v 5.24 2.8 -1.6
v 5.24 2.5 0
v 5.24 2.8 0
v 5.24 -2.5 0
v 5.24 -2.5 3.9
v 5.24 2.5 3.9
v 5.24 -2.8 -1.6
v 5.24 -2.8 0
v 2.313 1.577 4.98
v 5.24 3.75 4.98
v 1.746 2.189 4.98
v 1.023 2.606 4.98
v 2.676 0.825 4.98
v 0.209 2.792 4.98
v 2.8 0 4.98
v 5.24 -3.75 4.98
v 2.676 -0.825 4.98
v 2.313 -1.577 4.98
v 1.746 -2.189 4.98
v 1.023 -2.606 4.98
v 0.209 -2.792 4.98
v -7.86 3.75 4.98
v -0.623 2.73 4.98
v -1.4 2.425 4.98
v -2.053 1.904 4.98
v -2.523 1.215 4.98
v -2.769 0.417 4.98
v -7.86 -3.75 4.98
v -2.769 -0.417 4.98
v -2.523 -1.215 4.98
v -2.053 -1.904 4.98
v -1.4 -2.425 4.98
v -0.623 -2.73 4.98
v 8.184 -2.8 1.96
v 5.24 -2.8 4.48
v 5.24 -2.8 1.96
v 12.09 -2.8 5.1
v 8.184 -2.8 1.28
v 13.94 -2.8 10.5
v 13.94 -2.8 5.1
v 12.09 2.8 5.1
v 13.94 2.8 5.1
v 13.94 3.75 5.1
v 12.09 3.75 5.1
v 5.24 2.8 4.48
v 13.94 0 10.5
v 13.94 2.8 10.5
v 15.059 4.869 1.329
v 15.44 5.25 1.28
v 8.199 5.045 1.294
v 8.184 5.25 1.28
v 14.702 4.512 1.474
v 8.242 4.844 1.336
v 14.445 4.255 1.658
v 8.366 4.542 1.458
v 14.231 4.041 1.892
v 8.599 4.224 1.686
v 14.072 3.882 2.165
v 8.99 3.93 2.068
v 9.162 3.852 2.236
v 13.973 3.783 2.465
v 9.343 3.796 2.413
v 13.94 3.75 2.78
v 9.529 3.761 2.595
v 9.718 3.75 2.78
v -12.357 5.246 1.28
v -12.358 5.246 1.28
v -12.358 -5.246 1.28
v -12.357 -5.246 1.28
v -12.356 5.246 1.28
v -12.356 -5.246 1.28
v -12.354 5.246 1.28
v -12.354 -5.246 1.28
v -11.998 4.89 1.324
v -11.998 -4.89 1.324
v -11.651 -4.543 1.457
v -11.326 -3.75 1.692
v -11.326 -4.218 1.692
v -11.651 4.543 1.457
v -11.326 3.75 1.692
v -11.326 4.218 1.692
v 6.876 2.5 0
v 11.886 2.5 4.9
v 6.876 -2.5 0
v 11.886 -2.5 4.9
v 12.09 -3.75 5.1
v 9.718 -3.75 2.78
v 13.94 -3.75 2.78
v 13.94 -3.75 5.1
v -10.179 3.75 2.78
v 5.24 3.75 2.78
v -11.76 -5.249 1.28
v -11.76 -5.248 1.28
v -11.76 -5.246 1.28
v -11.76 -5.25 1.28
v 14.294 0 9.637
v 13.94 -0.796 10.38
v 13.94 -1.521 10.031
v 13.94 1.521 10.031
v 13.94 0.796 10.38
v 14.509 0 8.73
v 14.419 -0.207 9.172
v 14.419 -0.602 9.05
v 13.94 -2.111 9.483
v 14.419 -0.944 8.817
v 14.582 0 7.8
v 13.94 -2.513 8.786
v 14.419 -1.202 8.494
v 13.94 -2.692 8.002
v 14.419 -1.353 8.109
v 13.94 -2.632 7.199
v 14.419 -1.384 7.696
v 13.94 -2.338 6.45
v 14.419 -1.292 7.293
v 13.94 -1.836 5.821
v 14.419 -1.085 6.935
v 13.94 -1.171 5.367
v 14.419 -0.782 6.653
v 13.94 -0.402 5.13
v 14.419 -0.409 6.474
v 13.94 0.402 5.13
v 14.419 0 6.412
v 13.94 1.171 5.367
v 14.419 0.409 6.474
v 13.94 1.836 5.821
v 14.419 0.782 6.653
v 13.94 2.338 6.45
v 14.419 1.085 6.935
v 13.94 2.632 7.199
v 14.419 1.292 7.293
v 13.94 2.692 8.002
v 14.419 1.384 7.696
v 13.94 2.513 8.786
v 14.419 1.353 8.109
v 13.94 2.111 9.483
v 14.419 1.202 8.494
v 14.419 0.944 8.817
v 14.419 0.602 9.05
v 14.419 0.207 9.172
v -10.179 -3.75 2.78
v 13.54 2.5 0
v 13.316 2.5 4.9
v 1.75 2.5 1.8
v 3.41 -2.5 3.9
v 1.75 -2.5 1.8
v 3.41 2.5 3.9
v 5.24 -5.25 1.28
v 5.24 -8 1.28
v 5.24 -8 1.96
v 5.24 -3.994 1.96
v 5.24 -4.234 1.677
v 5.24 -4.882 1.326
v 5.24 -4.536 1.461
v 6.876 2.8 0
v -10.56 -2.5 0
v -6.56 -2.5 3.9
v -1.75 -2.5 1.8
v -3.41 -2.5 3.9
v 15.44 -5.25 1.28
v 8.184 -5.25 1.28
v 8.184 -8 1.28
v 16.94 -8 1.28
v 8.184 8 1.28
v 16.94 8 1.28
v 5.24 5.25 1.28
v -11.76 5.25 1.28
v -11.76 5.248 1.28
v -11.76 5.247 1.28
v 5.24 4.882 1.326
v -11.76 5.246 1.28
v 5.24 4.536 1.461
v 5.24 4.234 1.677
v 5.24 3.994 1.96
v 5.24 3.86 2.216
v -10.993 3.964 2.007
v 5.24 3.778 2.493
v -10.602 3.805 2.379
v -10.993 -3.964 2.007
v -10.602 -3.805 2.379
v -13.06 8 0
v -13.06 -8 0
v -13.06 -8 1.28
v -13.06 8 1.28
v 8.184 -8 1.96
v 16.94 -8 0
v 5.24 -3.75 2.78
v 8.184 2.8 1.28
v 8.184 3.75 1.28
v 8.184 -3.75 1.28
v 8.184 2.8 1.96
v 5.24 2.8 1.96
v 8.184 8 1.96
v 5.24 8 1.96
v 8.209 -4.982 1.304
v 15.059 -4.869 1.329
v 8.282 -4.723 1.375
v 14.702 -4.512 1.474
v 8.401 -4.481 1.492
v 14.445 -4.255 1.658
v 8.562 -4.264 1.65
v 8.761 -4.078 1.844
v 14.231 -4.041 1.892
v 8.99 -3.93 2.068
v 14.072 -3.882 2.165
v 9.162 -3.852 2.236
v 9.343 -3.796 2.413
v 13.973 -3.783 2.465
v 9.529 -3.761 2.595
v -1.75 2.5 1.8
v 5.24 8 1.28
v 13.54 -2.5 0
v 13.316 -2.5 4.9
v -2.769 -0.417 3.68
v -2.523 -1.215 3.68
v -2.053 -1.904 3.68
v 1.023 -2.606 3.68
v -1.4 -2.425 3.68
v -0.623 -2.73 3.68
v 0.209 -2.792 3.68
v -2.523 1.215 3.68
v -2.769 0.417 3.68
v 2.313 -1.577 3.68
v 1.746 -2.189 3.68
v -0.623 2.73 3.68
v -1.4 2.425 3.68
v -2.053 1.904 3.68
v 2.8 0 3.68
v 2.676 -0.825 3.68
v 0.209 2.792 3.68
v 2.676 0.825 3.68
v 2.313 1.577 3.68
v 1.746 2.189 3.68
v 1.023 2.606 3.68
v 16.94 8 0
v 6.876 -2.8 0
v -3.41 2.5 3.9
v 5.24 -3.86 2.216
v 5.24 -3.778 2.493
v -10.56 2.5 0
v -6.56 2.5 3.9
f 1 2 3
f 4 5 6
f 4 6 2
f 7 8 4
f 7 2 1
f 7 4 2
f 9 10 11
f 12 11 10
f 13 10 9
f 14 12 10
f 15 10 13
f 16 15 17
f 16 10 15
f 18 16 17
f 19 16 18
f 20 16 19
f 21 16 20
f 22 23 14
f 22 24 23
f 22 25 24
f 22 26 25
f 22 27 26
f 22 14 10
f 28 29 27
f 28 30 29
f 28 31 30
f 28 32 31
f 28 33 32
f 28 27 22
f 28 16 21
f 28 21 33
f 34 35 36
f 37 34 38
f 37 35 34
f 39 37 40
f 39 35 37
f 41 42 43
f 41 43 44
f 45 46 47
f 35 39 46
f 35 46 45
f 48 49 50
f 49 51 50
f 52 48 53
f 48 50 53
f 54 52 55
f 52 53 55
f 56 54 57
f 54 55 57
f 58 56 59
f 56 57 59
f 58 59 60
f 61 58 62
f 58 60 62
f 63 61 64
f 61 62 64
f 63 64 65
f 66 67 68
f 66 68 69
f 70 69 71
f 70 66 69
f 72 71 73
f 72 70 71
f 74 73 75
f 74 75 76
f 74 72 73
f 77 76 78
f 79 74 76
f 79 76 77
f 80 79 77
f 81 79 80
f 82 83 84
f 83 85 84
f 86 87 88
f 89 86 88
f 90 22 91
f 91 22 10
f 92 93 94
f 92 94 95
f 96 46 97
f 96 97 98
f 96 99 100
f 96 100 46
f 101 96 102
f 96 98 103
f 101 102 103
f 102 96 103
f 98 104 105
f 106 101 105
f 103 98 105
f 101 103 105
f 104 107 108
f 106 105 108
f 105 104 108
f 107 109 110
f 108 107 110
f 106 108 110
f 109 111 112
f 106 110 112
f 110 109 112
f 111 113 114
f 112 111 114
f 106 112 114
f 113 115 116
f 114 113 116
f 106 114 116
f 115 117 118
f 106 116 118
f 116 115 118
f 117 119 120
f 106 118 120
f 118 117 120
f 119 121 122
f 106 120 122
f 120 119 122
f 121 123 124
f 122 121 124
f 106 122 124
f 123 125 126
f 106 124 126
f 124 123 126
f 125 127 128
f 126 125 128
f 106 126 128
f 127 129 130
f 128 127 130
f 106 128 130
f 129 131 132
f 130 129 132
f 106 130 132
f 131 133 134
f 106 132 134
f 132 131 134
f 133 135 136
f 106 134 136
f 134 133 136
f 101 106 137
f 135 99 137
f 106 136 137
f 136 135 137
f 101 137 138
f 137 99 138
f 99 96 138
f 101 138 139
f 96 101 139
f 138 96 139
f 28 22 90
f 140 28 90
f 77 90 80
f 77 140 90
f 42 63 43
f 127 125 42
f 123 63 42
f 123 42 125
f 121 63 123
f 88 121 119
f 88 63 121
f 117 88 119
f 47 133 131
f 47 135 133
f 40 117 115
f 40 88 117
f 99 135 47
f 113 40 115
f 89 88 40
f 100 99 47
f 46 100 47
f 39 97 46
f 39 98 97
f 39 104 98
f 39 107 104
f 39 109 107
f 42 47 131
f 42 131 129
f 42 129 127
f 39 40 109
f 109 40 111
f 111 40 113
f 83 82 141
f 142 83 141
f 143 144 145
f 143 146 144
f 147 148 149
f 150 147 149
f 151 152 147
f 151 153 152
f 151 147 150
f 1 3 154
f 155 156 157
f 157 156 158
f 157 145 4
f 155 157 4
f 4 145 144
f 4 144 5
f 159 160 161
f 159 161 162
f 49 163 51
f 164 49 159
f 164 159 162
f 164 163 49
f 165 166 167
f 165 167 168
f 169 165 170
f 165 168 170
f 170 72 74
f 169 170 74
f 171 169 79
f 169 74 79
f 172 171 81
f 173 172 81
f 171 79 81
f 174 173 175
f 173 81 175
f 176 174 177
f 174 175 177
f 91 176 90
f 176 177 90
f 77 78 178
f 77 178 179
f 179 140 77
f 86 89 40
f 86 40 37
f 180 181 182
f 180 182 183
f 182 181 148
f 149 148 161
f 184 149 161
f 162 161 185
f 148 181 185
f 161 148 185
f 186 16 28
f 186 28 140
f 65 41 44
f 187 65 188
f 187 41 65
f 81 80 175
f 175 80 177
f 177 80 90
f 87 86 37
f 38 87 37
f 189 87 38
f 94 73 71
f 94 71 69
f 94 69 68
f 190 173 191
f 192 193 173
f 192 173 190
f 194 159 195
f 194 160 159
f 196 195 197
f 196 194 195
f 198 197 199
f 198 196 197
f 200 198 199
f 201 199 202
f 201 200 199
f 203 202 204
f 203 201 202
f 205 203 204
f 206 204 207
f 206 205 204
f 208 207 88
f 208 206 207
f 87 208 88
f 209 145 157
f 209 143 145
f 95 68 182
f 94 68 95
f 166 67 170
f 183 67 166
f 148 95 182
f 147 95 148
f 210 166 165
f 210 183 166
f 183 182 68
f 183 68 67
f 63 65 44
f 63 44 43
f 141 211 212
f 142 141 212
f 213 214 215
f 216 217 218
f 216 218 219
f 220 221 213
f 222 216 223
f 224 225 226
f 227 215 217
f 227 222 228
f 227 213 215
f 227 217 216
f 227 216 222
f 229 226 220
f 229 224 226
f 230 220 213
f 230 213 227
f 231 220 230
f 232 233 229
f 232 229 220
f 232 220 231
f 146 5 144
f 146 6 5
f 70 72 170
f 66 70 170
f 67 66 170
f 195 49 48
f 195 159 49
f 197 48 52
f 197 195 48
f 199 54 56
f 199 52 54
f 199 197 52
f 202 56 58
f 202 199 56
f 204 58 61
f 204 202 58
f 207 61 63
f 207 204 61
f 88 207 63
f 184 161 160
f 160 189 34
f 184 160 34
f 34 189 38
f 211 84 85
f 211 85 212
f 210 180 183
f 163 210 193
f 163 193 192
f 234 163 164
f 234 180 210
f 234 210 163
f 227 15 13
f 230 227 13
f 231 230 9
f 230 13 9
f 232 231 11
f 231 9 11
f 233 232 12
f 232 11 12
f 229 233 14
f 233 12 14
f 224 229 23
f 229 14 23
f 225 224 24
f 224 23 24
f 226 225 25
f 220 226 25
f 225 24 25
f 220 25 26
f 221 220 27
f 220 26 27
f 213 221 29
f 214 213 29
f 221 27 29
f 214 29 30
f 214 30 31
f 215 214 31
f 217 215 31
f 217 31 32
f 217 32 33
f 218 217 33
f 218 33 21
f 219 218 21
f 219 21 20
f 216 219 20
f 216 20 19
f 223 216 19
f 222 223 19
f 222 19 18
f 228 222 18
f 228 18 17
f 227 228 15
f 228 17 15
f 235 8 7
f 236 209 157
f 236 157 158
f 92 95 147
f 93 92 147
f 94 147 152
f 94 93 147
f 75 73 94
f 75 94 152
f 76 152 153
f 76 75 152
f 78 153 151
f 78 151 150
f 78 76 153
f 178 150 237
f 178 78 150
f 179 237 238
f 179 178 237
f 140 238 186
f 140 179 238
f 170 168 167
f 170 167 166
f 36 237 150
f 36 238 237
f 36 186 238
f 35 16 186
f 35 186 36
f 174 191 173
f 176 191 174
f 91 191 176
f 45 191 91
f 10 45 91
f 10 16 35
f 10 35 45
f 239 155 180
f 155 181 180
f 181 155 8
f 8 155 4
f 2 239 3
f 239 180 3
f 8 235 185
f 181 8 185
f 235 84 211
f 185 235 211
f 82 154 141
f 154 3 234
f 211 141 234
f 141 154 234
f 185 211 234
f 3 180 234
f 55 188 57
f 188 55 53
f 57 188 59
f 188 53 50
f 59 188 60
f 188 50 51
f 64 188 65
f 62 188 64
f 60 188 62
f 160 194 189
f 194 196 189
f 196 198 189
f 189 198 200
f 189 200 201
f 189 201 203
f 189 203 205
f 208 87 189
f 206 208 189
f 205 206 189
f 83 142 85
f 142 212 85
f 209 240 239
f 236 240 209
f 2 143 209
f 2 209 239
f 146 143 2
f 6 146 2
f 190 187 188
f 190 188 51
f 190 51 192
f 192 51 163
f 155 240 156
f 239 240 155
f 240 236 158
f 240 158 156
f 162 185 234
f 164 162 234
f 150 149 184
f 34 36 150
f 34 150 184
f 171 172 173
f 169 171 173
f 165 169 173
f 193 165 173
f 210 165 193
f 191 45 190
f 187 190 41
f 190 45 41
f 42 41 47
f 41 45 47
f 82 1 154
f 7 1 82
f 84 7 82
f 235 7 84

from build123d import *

# Parameters (mm, degrees)
F0_W          = 30
F0_H          = 16
F1_DEPTH      = 1.28
F3_DEPTH      = 3.75
F5_DEPTH      = 2.8
F7_DEPTH      = 3.75
F8_W          = 2.9444776119
F8_H          = 5.2
F9_DEPTH      = 0.68
F10_T1_DEPTH  = 7.5
F10_T6_DEPTH  = 20.75
F10_T11_DEPTH = 24.5
F10_T16_DEPTH = 20.75
F10_T21_DEPTH = 24.5
F10_T26_DEPTH = 9.5055223881
F10_T31_DEPTH = 5.7555223881
F10_T36_DEPTH = 9.5055223881
F10_T41_DEPTH = 5.7555223881
F10_T47_DEPTH = 8.9958162388
F10_T51_DEPTH = 20.75
F10_T59_DEPTH = 20.75
F10_T64_DEPTH = 8.9958162388
F10_T71_DEPTH = 9.5055223881
F10_T76_DEPTH = 11.25
F10_T83_DEPTH = 11.25
F10_T87_DEPTH = 9.5055223881
F11_R         = 2.8
F12_DEPTH     = 1.3
F14_DEPTH     = 2.5


# Not quite as in the source:
# - a fillet or chamfer that OpenCascade refuses, or shapes differently, is made with other operations: its cross-section is extruded or revolved along the edge and cut away or added


with BuildPart() as f1:
    # F0 (on Top) → F1 (new body)
    with BuildSketch(Plane.XY):
        with Locations((1.94, 0)):
            Rectangle(F0_W, F0_H)
    extrude(amount=F1_DEPTH)

    # F2 (on Front) → F3 (join, symmetric)
    with BuildSketch(Plane.XZ):
        Polygon((5.24, 4.98), (-7.86, 4.98), (-11.76, 1.28), (5.24, 1.28), align=None)
    extrude(amount=F3_DEPTH, both=True)

    # F4 (on Front) → F5 (join, symmetric)
    with BuildSketch(Plane.XZ):
        Polygon((13.94, 10.5), (5.24, 4.48), (5.24, -1.6), (12.09, 5.1), (13.94, 5.1), align=None)
    extrude(amount=F5_DEPTH, both=True)

    # F6 (on Front) → F7 (join, symmetric)
    with BuildSketch(Plane.XZ):
        Polygon((13.94, 5.1), (12.09, 5.1), (6.8758208955, 0), (13.94, 0), align=None)
    extrude(amount=F7_DEPTH, both=True)

    # F8 (on face) → F9 (join)
    with BuildSketch(Plane.XY.offset(1.28)):
        with Locations((6.712238806, -5.4)):
            Rectangle(F8_W, F8_H)
        with Locations((6.712238806, 5.4)):
            Rectangle(F8_W, F8_H)
    extrude(amount=F9_DEPTH)

    # F10: fillet of radius 1.5 on 6 edges, made by hand

    # F10_s2 → F10_t1 (join)
    with BuildSketch(Plane.XZ.offset(-3.75)):
        with BuildLine():
            ThreePointArc((15.44, 1.28), (14.3793398282, 1.7193398282), (13.94, 2.78))
            Line((13.94, 2.78), (13.94, 1.28))
            Line((13.94, 1.28), (15.44, 1.28))
        make_face()
        with BuildLine():
            ThreePointArc((-12.3583264955, 1.28), (-11.802580745, 1.3867496058), (-11.3259358476, 1.6918044522))
            Line((-11.3259358476, 1.6918044522), (-11.76, 1.28))
            Line((-11.76, 1.28), (-12.3583264955, 1.28))
        make_face()
    extrude(amount=F10_T1_DEPTH)


with BuildPart() as f10_tool4:
    # F10_s5 → F10_t6 (new body)
    with BuildSketch(Plane.YZ.offset(-15.51)):
        with BuildLine():
            ThreePointArc((-5.25, 1.28), (-4.1893398282, 1.7193398282), (-3.75, 2.78))
            Line((-3.75, 2.78), (-3.75, 1.28))
            Line((-3.75, 1.28), (-5.25, 1.28))
        make_face()
    extrude(amount=F10_T6_DEPTH)

    split(bisect_by=Plane(origin=(-6.2098546713, 0, 6.5455224913), x_dir=(0, 1, 0), z_dir=(0.6882604319, 0, -0.7254636985)), keep=Keep.TOP)


with BuildPart() as f1_1:
    add(f1.part)

    # F10_t3: union F10_tool4
    add(f10_tool4.part)


with BuildPart() as f10_tool9:
    # F10_s10 → F10_t11 (new body)
    with BuildSketch(Plane.YZ.offset(-15.51)):
        with BuildLine():
            ThreePointArc((-5.25, 1.28), (-4.1893398282, 1.7193398282), (-3.75, 2.78))
            Line((-3.75, 2.78), (-3.75, 1.28))
            Line((-3.75, 1.28), (-5.25, 1.28))
        make_face()
    extrude(amount=F10_T11_DEPTH)

    split(bisect_by=Plane(origin=(3.361803676, 0, -3.4370679374), x_dir=(0, 1, 0), z_dir=(0.6992361874, 0, -0.7148907289)), keep=Keep.TOP)


with BuildPart() as f1_2:
    add(f1_1.part)

    # F10_t8: union F10_tool9
    add(f10_tool9.part)


with BuildPart() as f10_tool14:
    # F10_s15 → F10_t16 (new body)
    with BuildSketch(Plane.YZ.offset(-15.51)):
        with BuildLine():
            ThreePointArc((5.25, 1.28), (4.1893398282, 1.7193398282), (3.75, 2.78))
            Line((3.75, 2.78), (3.75, 1.28))
            Line((3.75, 1.28), (5.25, 1.28))
        make_face()
    extrude(amount=F10_T16_DEPTH)

    split(bisect_by=Plane(origin=(-6.2098546713, 0, 6.5455224913), x_dir=(0, 1, 0), z_dir=(0.6882604319, 0, -0.7254636985)), keep=Keep.TOP)


with BuildPart() as f1_3:
    add(f1_2.part)

    # F10_t13: union F10_tool14
    add(f10_tool14.part)


with BuildPart() as f10_tool19:
    # F10_s20 → F10_t21 (new body)
    with BuildSketch(Plane.YZ.offset(-15.51)):
        with BuildLine():
            ThreePointArc((5.25, 1.28), (4.1893398282, 1.7193398282), (3.75, 2.78))
            Line((3.75, 2.78), (3.75, 1.28))
            Line((3.75, 1.28), (5.25, 1.28))
        make_face()
    extrude(amount=F10_T21_DEPTH)

    split(bisect_by=Plane(origin=(3.361803676, 0, -3.4370679374), x_dir=(0, 1, 0), z_dir=(0.6992361874, 0, -0.7148907289)), keep=Keep.TOP)


with BuildPart() as f1_4:
    add(f1_3.part)

    # F10_t18: union F10_tool19
    add(f10_tool19.part)


with BuildPart() as f10_tool24:
    # F10_s25 → F10_t26 (new body)
    with BuildSketch(Plane.YZ.offset(4.4344776119)):
        with BuildLine():
            ThreePointArc((-5.25, 1.28), (-4.1893398282, 1.7193398282), (-3.75, 2.78))
            Line((-3.75, 2.78), (-3.75, 1.28))
            Line((-3.75, 1.28), (-5.25, 1.28))
        make_face()
    extrude(amount=F10_T26_DEPTH)

    split(bisect_by=Plane.YZ.offset(5.24), keep=Keep.BOTTOM)


with BuildPart() as f1_5:
    add(f1_4.part)

    # F10_t23: union F10_tool24
    add(f10_tool24.part)


with BuildPart() as f10_tool29:
    # F10_s30 → F10_t31 (new body)
    with BuildSketch(Plane.YZ.offset(8.1844776119)):
        with BuildLine():
            ThreePointArc((-5.25, 1.28), (-4.1893398282, 1.7193398282), (-3.75, 2.78))
            Line((-3.75, 2.78), (-3.75, 1.28))
            Line((-3.75, 1.28), (-5.25, 1.28))
        make_face()
    extrude(amount=F10_T31_DEPTH)

    split(bisect_by=Plane(origin=(3.361803676, 0, -3.4370679374), x_dir=(0, 1, 0), z_dir=(0.6992361874, 0, -0.7148907289)), keep=Keep.TOP)


with BuildPart() as f1_6:
    add(f1_5.part)

    # F10_t28: union F10_tool29
    add(f10_tool29.part)


with BuildPart() as f10_tool34:
    # F10_s35 → F10_t36 (new body)
    with BuildSketch(Plane.YZ.offset(4.4344776119)):
        with BuildLine():
            ThreePointArc((5.25, 1.28), (4.1893398282, 1.7193398282), (3.75, 2.78))
            Line((3.75, 2.78), (3.75, 1.28))
            Line((3.75, 1.28), (5.25, 1.28))
        make_face()
    extrude(amount=F10_T36_DEPTH)

    split(bisect_by=Plane.YZ.offset(5.24), keep=Keep.BOTTOM)


with BuildPart() as f1_7:
    add(f1_6.part)

    # F10_t33: union F10_tool34
    add(f10_tool34.part)


with BuildPart() as f10_tool39:
    # F10_s40 → F10_t41 (new body)
    with BuildSketch(Plane.YZ.offset(8.1844776119)):
        with BuildLine():
            ThreePointArc((5.25, 1.28), (4.1893398282, 1.7193398282), (3.75, 2.78))
            Line((3.75, 2.78), (3.75, 1.28))
            Line((3.75, 1.28), (5.25, 1.28))
        make_face()
    extrude(amount=F10_T41_DEPTH)

    split(bisect_by=Plane(origin=(3.361803676, 0, -3.4370679374), x_dir=(0, 1, 0), z_dir=(0.6992361874, 0, -0.7148907289)), keep=Keep.TOP)


with BuildPart() as f1_8:
    add(f1_7.part)

    # F10_t38: union F10_tool39
    add(f10_tool39.part)


with BuildPart() as f10_tool45:
    # F10_s46 → F10_t47 (new body)
    with BuildSketch(Plane.XZ.offset(-3.75)):
        with BuildLine():
            ThreePointArc((-12.3583264955, 1.28), (-11.802580745, 1.3867496058), (-11.3259358476, 1.6918044522))
            Line((-11.3259358476, 1.6918044522), (-11.76, 1.28))
            Line((-11.76, 1.28), (-12.3583264955, 1.28))
        make_face()
    extrude(amount=F10_T47_DEPTH)

    split(bisect_by=Plane.XZ.offset(3.75), keep=Keep.TOP)


with BuildPart() as f10_tool49:
    # F10_s50 → F10_t51 (new body)
    with BuildSketch(Plane.YZ.offset(-15.51)):
        with BuildLine():
            ThreePointArc((-5.25, 1.28), (-4.1893398282, 1.7193398282), (-3.75, 2.78))
            Line((-3.75, 2.78), (-3.75, 1.28))
            Line((-3.75, 1.28), (-5.25, 1.28))
        make_face()
    extrude(amount=F10_T51_DEPTH)

    split(bisect_by=Plane.YZ.offset(-13.06), keep=Keep.TOP)

    split(bisect_by=Plane(origin=(-6.2098546713, 0, 6.5455224913), x_dir=(0, 1, 0), z_dir=(-0.6882604319, 0, 0.7254636985)), keep=Keep.TOP)


with BuildPart() as f10_tool45_1:
    add(f10_tool45.part)

    # F10_t54: intersect F10_tool49
    add(f10_tool49.part, mode=Mode.INTERSECT)


with BuildPart() as f1_9:
    add(f1_8.part)

    # F10_t43: union F10_tool45
    add(f10_tool45_1.part)


with BuildPart() as f10_tool57:
    # F10_s58 → F10_t59 (new body)
    with BuildSketch(Plane.YZ.offset(-15.51)):
        with BuildLine():
            ThreePointArc((5.25, 1.28), (4.1893398282, 1.7193398282), (3.75, 2.78))
            Line((3.75, 2.78), (3.75, 1.28))
            Line((3.75, 1.28), (5.25, 1.28))
        make_face()
    extrude(amount=F10_T59_DEPTH)

    split(bisect_by=Plane.YZ.offset(-13.06), keep=Keep.TOP)

    split(bisect_by=Plane(origin=(-6.2098546713, 0, 6.5455224913), x_dir=(0, 1, 0), z_dir=(-0.6882604319, 0, 0.7254636985)), keep=Keep.TOP)


with BuildPart() as f10_tool62:
    # F10_s63 → F10_t64 (new body)
    with BuildSketch(Plane.XZ.offset(-5.2458162388)):
        with BuildLine():
            ThreePointArc((-12.3583264955, 1.28), (-11.802580745, 1.3867496058), (-11.3259358476, 1.6918044522))
            Line((-11.3259358476, 1.6918044522), (-11.76, 1.28))
            Line((-11.76, 1.28), (-12.3583264955, 1.28))
        make_face()
    extrude(amount=F10_T64_DEPTH)

    split(bisect_by=Plane.XZ.offset(-3.75), keep=Keep.BOTTOM)


with BuildPart() as f10_tool57_1:
    add(f10_tool57.part)

    # F10_t66: intersect F10_tool62
    add(f10_tool62.part, mode=Mode.INTERSECT)


with BuildPart() as f1_10:
    add(f1_9.part)

    # F10_t55: union F10_tool57
    add(f10_tool57_1.part)


with BuildPart() as f10_tool69:
    # F10_s70 → F10_t71 (new body)
    with BuildSketch(Plane.YZ.offset(8.1844776119)):
        with BuildLine():
            ThreePointArc((-5.25, 1.28), (-4.1893398282, 1.7193398282), (-3.75, 2.78))
            Line((-3.75, 2.78), (-3.75, 1.28))
            Line((-3.75, 1.28), (-5.25, 1.28))
        make_face()
    extrude(amount=F10_T71_DEPTH)

    split(bisect_by=Plane.YZ.offset(16.94), keep=Keep.BOTTOM)

    split(bisect_by=Plane.YZ.offset(13.94), keep=Keep.TOP)


with BuildPart() as f10_tool74:
    # F10_s75 → F10_t76 (new body)
    with BuildSketch(Plane.XZ.offset(7.5)):
        with BuildLine():
            ThreePointArc((15.44, 1.28), (14.3793398282, 1.7193398282), (13.94, 2.78))
            Line((13.94, 2.78), (13.94, 1.28))
            Line((13.94, 1.28), (15.44, 1.28))
        make_face()
    extrude(amount=-F10_T76_DEPTH)

    split(bisect_by=Plane.XZ.offset(3.75), keep=Keep.TOP)


with BuildPart() as f10_tool69_1:
    add(f10_tool69.part)

    # F10_t78: intersect F10_tool74
    add(f10_tool74.part, mode=Mode.INTERSECT)


with BuildPart() as f1_11:
    add(f1_10.part)

    # F10_t67: union F10_tool69
    add(f10_tool69_1.part)


with BuildPart() as f10_tool81:
    # F10_s82 → F10_t83 (new body)
    with BuildSketch(Plane.XZ.offset(3.75)):
        with BuildLine():
            ThreePointArc((15.44, 1.28), (14.3793398282, 1.7193398282), (13.94, 2.78))
            Line((13.94, 2.78), (13.94, 1.28))
            Line((13.94, 1.28), (15.44, 1.28))
        make_face()
    extrude(amount=-F10_T83_DEPTH)

    split(bisect_by=Plane.XZ.offset(-3.75), keep=Keep.BOTTOM)


with BuildPart() as f10_tool85:
    # F10_s86 → F10_t87 (new body)
    with BuildSketch(Plane.YZ.offset(8.1844776119)):
        with BuildLine():
            ThreePointArc((5.25, 1.28), (4.1893398282, 1.7193398282), (3.75, 2.78))
            Line((3.75, 2.78), (3.75, 1.28))
            Line((3.75, 1.28), (5.25, 1.28))
        make_face()
    extrude(amount=F10_T87_DEPTH)

    split(bisect_by=Plane.YZ.offset(16.94), keep=Keep.BOTTOM)

    split(bisect_by=Plane.YZ.offset(13.94), keep=Keep.TOP)


with BuildPart() as f10_tool81_1:
    add(f10_tool81.part)

    # F10_t90: intersect F10_tool85
    add(f10_tool85.part, mode=Mode.INTERSECT)


with BuildPart() as f1_12:
    add(f1_11.part)

    # F10_t79: union F10_tool81
    add(f10_tool81_1.part)

    # F11 (on face) → F12 (cut)
    with BuildSketch(Plane.XY.offset(4.98)):
        Circle(F11_R)
    extrude(amount=-F12_DEPTH, mode=Mode.SUBTRACT)

    # F13 (on Front) → F14 (cut, symmetric)
    with BuildSketch(Plane.XZ):
        Polygon((-6.56, 3.9), (-10.56, 0), (5.24, 0), (5.24, 3.9), (3.41, 3.9), (1.75, 1.8), (-1.75, 1.8), (-3.41, 3.9), align=None)
        Polygon((11.8855223881, 4.9), (6.8758208955, 0), (13.54, 0), (13.316296041, 4.9), align=None)
    extrude(amount=F14_DEPTH, both=True, mode=Mode.SUBTRACT)

    # F15 (on Front) → F16 (revolve)
    with BuildSketch(Plane.XZ):
        with BuildLine():
            Line((13.94, 7.8), (14.5818286702, 7.8))
            ThreePointArc((14.5818286702, 7.8), (14.4191665899, 9.1876188275), (13.94, 10.5))
            Line((13.94, 10.5), (13.94, 7.8))
        make_face()
    revolve(axis=Axis((14.2609143351, 0, 7.8), (1, 0, 0)))


solid = f1_12.part
